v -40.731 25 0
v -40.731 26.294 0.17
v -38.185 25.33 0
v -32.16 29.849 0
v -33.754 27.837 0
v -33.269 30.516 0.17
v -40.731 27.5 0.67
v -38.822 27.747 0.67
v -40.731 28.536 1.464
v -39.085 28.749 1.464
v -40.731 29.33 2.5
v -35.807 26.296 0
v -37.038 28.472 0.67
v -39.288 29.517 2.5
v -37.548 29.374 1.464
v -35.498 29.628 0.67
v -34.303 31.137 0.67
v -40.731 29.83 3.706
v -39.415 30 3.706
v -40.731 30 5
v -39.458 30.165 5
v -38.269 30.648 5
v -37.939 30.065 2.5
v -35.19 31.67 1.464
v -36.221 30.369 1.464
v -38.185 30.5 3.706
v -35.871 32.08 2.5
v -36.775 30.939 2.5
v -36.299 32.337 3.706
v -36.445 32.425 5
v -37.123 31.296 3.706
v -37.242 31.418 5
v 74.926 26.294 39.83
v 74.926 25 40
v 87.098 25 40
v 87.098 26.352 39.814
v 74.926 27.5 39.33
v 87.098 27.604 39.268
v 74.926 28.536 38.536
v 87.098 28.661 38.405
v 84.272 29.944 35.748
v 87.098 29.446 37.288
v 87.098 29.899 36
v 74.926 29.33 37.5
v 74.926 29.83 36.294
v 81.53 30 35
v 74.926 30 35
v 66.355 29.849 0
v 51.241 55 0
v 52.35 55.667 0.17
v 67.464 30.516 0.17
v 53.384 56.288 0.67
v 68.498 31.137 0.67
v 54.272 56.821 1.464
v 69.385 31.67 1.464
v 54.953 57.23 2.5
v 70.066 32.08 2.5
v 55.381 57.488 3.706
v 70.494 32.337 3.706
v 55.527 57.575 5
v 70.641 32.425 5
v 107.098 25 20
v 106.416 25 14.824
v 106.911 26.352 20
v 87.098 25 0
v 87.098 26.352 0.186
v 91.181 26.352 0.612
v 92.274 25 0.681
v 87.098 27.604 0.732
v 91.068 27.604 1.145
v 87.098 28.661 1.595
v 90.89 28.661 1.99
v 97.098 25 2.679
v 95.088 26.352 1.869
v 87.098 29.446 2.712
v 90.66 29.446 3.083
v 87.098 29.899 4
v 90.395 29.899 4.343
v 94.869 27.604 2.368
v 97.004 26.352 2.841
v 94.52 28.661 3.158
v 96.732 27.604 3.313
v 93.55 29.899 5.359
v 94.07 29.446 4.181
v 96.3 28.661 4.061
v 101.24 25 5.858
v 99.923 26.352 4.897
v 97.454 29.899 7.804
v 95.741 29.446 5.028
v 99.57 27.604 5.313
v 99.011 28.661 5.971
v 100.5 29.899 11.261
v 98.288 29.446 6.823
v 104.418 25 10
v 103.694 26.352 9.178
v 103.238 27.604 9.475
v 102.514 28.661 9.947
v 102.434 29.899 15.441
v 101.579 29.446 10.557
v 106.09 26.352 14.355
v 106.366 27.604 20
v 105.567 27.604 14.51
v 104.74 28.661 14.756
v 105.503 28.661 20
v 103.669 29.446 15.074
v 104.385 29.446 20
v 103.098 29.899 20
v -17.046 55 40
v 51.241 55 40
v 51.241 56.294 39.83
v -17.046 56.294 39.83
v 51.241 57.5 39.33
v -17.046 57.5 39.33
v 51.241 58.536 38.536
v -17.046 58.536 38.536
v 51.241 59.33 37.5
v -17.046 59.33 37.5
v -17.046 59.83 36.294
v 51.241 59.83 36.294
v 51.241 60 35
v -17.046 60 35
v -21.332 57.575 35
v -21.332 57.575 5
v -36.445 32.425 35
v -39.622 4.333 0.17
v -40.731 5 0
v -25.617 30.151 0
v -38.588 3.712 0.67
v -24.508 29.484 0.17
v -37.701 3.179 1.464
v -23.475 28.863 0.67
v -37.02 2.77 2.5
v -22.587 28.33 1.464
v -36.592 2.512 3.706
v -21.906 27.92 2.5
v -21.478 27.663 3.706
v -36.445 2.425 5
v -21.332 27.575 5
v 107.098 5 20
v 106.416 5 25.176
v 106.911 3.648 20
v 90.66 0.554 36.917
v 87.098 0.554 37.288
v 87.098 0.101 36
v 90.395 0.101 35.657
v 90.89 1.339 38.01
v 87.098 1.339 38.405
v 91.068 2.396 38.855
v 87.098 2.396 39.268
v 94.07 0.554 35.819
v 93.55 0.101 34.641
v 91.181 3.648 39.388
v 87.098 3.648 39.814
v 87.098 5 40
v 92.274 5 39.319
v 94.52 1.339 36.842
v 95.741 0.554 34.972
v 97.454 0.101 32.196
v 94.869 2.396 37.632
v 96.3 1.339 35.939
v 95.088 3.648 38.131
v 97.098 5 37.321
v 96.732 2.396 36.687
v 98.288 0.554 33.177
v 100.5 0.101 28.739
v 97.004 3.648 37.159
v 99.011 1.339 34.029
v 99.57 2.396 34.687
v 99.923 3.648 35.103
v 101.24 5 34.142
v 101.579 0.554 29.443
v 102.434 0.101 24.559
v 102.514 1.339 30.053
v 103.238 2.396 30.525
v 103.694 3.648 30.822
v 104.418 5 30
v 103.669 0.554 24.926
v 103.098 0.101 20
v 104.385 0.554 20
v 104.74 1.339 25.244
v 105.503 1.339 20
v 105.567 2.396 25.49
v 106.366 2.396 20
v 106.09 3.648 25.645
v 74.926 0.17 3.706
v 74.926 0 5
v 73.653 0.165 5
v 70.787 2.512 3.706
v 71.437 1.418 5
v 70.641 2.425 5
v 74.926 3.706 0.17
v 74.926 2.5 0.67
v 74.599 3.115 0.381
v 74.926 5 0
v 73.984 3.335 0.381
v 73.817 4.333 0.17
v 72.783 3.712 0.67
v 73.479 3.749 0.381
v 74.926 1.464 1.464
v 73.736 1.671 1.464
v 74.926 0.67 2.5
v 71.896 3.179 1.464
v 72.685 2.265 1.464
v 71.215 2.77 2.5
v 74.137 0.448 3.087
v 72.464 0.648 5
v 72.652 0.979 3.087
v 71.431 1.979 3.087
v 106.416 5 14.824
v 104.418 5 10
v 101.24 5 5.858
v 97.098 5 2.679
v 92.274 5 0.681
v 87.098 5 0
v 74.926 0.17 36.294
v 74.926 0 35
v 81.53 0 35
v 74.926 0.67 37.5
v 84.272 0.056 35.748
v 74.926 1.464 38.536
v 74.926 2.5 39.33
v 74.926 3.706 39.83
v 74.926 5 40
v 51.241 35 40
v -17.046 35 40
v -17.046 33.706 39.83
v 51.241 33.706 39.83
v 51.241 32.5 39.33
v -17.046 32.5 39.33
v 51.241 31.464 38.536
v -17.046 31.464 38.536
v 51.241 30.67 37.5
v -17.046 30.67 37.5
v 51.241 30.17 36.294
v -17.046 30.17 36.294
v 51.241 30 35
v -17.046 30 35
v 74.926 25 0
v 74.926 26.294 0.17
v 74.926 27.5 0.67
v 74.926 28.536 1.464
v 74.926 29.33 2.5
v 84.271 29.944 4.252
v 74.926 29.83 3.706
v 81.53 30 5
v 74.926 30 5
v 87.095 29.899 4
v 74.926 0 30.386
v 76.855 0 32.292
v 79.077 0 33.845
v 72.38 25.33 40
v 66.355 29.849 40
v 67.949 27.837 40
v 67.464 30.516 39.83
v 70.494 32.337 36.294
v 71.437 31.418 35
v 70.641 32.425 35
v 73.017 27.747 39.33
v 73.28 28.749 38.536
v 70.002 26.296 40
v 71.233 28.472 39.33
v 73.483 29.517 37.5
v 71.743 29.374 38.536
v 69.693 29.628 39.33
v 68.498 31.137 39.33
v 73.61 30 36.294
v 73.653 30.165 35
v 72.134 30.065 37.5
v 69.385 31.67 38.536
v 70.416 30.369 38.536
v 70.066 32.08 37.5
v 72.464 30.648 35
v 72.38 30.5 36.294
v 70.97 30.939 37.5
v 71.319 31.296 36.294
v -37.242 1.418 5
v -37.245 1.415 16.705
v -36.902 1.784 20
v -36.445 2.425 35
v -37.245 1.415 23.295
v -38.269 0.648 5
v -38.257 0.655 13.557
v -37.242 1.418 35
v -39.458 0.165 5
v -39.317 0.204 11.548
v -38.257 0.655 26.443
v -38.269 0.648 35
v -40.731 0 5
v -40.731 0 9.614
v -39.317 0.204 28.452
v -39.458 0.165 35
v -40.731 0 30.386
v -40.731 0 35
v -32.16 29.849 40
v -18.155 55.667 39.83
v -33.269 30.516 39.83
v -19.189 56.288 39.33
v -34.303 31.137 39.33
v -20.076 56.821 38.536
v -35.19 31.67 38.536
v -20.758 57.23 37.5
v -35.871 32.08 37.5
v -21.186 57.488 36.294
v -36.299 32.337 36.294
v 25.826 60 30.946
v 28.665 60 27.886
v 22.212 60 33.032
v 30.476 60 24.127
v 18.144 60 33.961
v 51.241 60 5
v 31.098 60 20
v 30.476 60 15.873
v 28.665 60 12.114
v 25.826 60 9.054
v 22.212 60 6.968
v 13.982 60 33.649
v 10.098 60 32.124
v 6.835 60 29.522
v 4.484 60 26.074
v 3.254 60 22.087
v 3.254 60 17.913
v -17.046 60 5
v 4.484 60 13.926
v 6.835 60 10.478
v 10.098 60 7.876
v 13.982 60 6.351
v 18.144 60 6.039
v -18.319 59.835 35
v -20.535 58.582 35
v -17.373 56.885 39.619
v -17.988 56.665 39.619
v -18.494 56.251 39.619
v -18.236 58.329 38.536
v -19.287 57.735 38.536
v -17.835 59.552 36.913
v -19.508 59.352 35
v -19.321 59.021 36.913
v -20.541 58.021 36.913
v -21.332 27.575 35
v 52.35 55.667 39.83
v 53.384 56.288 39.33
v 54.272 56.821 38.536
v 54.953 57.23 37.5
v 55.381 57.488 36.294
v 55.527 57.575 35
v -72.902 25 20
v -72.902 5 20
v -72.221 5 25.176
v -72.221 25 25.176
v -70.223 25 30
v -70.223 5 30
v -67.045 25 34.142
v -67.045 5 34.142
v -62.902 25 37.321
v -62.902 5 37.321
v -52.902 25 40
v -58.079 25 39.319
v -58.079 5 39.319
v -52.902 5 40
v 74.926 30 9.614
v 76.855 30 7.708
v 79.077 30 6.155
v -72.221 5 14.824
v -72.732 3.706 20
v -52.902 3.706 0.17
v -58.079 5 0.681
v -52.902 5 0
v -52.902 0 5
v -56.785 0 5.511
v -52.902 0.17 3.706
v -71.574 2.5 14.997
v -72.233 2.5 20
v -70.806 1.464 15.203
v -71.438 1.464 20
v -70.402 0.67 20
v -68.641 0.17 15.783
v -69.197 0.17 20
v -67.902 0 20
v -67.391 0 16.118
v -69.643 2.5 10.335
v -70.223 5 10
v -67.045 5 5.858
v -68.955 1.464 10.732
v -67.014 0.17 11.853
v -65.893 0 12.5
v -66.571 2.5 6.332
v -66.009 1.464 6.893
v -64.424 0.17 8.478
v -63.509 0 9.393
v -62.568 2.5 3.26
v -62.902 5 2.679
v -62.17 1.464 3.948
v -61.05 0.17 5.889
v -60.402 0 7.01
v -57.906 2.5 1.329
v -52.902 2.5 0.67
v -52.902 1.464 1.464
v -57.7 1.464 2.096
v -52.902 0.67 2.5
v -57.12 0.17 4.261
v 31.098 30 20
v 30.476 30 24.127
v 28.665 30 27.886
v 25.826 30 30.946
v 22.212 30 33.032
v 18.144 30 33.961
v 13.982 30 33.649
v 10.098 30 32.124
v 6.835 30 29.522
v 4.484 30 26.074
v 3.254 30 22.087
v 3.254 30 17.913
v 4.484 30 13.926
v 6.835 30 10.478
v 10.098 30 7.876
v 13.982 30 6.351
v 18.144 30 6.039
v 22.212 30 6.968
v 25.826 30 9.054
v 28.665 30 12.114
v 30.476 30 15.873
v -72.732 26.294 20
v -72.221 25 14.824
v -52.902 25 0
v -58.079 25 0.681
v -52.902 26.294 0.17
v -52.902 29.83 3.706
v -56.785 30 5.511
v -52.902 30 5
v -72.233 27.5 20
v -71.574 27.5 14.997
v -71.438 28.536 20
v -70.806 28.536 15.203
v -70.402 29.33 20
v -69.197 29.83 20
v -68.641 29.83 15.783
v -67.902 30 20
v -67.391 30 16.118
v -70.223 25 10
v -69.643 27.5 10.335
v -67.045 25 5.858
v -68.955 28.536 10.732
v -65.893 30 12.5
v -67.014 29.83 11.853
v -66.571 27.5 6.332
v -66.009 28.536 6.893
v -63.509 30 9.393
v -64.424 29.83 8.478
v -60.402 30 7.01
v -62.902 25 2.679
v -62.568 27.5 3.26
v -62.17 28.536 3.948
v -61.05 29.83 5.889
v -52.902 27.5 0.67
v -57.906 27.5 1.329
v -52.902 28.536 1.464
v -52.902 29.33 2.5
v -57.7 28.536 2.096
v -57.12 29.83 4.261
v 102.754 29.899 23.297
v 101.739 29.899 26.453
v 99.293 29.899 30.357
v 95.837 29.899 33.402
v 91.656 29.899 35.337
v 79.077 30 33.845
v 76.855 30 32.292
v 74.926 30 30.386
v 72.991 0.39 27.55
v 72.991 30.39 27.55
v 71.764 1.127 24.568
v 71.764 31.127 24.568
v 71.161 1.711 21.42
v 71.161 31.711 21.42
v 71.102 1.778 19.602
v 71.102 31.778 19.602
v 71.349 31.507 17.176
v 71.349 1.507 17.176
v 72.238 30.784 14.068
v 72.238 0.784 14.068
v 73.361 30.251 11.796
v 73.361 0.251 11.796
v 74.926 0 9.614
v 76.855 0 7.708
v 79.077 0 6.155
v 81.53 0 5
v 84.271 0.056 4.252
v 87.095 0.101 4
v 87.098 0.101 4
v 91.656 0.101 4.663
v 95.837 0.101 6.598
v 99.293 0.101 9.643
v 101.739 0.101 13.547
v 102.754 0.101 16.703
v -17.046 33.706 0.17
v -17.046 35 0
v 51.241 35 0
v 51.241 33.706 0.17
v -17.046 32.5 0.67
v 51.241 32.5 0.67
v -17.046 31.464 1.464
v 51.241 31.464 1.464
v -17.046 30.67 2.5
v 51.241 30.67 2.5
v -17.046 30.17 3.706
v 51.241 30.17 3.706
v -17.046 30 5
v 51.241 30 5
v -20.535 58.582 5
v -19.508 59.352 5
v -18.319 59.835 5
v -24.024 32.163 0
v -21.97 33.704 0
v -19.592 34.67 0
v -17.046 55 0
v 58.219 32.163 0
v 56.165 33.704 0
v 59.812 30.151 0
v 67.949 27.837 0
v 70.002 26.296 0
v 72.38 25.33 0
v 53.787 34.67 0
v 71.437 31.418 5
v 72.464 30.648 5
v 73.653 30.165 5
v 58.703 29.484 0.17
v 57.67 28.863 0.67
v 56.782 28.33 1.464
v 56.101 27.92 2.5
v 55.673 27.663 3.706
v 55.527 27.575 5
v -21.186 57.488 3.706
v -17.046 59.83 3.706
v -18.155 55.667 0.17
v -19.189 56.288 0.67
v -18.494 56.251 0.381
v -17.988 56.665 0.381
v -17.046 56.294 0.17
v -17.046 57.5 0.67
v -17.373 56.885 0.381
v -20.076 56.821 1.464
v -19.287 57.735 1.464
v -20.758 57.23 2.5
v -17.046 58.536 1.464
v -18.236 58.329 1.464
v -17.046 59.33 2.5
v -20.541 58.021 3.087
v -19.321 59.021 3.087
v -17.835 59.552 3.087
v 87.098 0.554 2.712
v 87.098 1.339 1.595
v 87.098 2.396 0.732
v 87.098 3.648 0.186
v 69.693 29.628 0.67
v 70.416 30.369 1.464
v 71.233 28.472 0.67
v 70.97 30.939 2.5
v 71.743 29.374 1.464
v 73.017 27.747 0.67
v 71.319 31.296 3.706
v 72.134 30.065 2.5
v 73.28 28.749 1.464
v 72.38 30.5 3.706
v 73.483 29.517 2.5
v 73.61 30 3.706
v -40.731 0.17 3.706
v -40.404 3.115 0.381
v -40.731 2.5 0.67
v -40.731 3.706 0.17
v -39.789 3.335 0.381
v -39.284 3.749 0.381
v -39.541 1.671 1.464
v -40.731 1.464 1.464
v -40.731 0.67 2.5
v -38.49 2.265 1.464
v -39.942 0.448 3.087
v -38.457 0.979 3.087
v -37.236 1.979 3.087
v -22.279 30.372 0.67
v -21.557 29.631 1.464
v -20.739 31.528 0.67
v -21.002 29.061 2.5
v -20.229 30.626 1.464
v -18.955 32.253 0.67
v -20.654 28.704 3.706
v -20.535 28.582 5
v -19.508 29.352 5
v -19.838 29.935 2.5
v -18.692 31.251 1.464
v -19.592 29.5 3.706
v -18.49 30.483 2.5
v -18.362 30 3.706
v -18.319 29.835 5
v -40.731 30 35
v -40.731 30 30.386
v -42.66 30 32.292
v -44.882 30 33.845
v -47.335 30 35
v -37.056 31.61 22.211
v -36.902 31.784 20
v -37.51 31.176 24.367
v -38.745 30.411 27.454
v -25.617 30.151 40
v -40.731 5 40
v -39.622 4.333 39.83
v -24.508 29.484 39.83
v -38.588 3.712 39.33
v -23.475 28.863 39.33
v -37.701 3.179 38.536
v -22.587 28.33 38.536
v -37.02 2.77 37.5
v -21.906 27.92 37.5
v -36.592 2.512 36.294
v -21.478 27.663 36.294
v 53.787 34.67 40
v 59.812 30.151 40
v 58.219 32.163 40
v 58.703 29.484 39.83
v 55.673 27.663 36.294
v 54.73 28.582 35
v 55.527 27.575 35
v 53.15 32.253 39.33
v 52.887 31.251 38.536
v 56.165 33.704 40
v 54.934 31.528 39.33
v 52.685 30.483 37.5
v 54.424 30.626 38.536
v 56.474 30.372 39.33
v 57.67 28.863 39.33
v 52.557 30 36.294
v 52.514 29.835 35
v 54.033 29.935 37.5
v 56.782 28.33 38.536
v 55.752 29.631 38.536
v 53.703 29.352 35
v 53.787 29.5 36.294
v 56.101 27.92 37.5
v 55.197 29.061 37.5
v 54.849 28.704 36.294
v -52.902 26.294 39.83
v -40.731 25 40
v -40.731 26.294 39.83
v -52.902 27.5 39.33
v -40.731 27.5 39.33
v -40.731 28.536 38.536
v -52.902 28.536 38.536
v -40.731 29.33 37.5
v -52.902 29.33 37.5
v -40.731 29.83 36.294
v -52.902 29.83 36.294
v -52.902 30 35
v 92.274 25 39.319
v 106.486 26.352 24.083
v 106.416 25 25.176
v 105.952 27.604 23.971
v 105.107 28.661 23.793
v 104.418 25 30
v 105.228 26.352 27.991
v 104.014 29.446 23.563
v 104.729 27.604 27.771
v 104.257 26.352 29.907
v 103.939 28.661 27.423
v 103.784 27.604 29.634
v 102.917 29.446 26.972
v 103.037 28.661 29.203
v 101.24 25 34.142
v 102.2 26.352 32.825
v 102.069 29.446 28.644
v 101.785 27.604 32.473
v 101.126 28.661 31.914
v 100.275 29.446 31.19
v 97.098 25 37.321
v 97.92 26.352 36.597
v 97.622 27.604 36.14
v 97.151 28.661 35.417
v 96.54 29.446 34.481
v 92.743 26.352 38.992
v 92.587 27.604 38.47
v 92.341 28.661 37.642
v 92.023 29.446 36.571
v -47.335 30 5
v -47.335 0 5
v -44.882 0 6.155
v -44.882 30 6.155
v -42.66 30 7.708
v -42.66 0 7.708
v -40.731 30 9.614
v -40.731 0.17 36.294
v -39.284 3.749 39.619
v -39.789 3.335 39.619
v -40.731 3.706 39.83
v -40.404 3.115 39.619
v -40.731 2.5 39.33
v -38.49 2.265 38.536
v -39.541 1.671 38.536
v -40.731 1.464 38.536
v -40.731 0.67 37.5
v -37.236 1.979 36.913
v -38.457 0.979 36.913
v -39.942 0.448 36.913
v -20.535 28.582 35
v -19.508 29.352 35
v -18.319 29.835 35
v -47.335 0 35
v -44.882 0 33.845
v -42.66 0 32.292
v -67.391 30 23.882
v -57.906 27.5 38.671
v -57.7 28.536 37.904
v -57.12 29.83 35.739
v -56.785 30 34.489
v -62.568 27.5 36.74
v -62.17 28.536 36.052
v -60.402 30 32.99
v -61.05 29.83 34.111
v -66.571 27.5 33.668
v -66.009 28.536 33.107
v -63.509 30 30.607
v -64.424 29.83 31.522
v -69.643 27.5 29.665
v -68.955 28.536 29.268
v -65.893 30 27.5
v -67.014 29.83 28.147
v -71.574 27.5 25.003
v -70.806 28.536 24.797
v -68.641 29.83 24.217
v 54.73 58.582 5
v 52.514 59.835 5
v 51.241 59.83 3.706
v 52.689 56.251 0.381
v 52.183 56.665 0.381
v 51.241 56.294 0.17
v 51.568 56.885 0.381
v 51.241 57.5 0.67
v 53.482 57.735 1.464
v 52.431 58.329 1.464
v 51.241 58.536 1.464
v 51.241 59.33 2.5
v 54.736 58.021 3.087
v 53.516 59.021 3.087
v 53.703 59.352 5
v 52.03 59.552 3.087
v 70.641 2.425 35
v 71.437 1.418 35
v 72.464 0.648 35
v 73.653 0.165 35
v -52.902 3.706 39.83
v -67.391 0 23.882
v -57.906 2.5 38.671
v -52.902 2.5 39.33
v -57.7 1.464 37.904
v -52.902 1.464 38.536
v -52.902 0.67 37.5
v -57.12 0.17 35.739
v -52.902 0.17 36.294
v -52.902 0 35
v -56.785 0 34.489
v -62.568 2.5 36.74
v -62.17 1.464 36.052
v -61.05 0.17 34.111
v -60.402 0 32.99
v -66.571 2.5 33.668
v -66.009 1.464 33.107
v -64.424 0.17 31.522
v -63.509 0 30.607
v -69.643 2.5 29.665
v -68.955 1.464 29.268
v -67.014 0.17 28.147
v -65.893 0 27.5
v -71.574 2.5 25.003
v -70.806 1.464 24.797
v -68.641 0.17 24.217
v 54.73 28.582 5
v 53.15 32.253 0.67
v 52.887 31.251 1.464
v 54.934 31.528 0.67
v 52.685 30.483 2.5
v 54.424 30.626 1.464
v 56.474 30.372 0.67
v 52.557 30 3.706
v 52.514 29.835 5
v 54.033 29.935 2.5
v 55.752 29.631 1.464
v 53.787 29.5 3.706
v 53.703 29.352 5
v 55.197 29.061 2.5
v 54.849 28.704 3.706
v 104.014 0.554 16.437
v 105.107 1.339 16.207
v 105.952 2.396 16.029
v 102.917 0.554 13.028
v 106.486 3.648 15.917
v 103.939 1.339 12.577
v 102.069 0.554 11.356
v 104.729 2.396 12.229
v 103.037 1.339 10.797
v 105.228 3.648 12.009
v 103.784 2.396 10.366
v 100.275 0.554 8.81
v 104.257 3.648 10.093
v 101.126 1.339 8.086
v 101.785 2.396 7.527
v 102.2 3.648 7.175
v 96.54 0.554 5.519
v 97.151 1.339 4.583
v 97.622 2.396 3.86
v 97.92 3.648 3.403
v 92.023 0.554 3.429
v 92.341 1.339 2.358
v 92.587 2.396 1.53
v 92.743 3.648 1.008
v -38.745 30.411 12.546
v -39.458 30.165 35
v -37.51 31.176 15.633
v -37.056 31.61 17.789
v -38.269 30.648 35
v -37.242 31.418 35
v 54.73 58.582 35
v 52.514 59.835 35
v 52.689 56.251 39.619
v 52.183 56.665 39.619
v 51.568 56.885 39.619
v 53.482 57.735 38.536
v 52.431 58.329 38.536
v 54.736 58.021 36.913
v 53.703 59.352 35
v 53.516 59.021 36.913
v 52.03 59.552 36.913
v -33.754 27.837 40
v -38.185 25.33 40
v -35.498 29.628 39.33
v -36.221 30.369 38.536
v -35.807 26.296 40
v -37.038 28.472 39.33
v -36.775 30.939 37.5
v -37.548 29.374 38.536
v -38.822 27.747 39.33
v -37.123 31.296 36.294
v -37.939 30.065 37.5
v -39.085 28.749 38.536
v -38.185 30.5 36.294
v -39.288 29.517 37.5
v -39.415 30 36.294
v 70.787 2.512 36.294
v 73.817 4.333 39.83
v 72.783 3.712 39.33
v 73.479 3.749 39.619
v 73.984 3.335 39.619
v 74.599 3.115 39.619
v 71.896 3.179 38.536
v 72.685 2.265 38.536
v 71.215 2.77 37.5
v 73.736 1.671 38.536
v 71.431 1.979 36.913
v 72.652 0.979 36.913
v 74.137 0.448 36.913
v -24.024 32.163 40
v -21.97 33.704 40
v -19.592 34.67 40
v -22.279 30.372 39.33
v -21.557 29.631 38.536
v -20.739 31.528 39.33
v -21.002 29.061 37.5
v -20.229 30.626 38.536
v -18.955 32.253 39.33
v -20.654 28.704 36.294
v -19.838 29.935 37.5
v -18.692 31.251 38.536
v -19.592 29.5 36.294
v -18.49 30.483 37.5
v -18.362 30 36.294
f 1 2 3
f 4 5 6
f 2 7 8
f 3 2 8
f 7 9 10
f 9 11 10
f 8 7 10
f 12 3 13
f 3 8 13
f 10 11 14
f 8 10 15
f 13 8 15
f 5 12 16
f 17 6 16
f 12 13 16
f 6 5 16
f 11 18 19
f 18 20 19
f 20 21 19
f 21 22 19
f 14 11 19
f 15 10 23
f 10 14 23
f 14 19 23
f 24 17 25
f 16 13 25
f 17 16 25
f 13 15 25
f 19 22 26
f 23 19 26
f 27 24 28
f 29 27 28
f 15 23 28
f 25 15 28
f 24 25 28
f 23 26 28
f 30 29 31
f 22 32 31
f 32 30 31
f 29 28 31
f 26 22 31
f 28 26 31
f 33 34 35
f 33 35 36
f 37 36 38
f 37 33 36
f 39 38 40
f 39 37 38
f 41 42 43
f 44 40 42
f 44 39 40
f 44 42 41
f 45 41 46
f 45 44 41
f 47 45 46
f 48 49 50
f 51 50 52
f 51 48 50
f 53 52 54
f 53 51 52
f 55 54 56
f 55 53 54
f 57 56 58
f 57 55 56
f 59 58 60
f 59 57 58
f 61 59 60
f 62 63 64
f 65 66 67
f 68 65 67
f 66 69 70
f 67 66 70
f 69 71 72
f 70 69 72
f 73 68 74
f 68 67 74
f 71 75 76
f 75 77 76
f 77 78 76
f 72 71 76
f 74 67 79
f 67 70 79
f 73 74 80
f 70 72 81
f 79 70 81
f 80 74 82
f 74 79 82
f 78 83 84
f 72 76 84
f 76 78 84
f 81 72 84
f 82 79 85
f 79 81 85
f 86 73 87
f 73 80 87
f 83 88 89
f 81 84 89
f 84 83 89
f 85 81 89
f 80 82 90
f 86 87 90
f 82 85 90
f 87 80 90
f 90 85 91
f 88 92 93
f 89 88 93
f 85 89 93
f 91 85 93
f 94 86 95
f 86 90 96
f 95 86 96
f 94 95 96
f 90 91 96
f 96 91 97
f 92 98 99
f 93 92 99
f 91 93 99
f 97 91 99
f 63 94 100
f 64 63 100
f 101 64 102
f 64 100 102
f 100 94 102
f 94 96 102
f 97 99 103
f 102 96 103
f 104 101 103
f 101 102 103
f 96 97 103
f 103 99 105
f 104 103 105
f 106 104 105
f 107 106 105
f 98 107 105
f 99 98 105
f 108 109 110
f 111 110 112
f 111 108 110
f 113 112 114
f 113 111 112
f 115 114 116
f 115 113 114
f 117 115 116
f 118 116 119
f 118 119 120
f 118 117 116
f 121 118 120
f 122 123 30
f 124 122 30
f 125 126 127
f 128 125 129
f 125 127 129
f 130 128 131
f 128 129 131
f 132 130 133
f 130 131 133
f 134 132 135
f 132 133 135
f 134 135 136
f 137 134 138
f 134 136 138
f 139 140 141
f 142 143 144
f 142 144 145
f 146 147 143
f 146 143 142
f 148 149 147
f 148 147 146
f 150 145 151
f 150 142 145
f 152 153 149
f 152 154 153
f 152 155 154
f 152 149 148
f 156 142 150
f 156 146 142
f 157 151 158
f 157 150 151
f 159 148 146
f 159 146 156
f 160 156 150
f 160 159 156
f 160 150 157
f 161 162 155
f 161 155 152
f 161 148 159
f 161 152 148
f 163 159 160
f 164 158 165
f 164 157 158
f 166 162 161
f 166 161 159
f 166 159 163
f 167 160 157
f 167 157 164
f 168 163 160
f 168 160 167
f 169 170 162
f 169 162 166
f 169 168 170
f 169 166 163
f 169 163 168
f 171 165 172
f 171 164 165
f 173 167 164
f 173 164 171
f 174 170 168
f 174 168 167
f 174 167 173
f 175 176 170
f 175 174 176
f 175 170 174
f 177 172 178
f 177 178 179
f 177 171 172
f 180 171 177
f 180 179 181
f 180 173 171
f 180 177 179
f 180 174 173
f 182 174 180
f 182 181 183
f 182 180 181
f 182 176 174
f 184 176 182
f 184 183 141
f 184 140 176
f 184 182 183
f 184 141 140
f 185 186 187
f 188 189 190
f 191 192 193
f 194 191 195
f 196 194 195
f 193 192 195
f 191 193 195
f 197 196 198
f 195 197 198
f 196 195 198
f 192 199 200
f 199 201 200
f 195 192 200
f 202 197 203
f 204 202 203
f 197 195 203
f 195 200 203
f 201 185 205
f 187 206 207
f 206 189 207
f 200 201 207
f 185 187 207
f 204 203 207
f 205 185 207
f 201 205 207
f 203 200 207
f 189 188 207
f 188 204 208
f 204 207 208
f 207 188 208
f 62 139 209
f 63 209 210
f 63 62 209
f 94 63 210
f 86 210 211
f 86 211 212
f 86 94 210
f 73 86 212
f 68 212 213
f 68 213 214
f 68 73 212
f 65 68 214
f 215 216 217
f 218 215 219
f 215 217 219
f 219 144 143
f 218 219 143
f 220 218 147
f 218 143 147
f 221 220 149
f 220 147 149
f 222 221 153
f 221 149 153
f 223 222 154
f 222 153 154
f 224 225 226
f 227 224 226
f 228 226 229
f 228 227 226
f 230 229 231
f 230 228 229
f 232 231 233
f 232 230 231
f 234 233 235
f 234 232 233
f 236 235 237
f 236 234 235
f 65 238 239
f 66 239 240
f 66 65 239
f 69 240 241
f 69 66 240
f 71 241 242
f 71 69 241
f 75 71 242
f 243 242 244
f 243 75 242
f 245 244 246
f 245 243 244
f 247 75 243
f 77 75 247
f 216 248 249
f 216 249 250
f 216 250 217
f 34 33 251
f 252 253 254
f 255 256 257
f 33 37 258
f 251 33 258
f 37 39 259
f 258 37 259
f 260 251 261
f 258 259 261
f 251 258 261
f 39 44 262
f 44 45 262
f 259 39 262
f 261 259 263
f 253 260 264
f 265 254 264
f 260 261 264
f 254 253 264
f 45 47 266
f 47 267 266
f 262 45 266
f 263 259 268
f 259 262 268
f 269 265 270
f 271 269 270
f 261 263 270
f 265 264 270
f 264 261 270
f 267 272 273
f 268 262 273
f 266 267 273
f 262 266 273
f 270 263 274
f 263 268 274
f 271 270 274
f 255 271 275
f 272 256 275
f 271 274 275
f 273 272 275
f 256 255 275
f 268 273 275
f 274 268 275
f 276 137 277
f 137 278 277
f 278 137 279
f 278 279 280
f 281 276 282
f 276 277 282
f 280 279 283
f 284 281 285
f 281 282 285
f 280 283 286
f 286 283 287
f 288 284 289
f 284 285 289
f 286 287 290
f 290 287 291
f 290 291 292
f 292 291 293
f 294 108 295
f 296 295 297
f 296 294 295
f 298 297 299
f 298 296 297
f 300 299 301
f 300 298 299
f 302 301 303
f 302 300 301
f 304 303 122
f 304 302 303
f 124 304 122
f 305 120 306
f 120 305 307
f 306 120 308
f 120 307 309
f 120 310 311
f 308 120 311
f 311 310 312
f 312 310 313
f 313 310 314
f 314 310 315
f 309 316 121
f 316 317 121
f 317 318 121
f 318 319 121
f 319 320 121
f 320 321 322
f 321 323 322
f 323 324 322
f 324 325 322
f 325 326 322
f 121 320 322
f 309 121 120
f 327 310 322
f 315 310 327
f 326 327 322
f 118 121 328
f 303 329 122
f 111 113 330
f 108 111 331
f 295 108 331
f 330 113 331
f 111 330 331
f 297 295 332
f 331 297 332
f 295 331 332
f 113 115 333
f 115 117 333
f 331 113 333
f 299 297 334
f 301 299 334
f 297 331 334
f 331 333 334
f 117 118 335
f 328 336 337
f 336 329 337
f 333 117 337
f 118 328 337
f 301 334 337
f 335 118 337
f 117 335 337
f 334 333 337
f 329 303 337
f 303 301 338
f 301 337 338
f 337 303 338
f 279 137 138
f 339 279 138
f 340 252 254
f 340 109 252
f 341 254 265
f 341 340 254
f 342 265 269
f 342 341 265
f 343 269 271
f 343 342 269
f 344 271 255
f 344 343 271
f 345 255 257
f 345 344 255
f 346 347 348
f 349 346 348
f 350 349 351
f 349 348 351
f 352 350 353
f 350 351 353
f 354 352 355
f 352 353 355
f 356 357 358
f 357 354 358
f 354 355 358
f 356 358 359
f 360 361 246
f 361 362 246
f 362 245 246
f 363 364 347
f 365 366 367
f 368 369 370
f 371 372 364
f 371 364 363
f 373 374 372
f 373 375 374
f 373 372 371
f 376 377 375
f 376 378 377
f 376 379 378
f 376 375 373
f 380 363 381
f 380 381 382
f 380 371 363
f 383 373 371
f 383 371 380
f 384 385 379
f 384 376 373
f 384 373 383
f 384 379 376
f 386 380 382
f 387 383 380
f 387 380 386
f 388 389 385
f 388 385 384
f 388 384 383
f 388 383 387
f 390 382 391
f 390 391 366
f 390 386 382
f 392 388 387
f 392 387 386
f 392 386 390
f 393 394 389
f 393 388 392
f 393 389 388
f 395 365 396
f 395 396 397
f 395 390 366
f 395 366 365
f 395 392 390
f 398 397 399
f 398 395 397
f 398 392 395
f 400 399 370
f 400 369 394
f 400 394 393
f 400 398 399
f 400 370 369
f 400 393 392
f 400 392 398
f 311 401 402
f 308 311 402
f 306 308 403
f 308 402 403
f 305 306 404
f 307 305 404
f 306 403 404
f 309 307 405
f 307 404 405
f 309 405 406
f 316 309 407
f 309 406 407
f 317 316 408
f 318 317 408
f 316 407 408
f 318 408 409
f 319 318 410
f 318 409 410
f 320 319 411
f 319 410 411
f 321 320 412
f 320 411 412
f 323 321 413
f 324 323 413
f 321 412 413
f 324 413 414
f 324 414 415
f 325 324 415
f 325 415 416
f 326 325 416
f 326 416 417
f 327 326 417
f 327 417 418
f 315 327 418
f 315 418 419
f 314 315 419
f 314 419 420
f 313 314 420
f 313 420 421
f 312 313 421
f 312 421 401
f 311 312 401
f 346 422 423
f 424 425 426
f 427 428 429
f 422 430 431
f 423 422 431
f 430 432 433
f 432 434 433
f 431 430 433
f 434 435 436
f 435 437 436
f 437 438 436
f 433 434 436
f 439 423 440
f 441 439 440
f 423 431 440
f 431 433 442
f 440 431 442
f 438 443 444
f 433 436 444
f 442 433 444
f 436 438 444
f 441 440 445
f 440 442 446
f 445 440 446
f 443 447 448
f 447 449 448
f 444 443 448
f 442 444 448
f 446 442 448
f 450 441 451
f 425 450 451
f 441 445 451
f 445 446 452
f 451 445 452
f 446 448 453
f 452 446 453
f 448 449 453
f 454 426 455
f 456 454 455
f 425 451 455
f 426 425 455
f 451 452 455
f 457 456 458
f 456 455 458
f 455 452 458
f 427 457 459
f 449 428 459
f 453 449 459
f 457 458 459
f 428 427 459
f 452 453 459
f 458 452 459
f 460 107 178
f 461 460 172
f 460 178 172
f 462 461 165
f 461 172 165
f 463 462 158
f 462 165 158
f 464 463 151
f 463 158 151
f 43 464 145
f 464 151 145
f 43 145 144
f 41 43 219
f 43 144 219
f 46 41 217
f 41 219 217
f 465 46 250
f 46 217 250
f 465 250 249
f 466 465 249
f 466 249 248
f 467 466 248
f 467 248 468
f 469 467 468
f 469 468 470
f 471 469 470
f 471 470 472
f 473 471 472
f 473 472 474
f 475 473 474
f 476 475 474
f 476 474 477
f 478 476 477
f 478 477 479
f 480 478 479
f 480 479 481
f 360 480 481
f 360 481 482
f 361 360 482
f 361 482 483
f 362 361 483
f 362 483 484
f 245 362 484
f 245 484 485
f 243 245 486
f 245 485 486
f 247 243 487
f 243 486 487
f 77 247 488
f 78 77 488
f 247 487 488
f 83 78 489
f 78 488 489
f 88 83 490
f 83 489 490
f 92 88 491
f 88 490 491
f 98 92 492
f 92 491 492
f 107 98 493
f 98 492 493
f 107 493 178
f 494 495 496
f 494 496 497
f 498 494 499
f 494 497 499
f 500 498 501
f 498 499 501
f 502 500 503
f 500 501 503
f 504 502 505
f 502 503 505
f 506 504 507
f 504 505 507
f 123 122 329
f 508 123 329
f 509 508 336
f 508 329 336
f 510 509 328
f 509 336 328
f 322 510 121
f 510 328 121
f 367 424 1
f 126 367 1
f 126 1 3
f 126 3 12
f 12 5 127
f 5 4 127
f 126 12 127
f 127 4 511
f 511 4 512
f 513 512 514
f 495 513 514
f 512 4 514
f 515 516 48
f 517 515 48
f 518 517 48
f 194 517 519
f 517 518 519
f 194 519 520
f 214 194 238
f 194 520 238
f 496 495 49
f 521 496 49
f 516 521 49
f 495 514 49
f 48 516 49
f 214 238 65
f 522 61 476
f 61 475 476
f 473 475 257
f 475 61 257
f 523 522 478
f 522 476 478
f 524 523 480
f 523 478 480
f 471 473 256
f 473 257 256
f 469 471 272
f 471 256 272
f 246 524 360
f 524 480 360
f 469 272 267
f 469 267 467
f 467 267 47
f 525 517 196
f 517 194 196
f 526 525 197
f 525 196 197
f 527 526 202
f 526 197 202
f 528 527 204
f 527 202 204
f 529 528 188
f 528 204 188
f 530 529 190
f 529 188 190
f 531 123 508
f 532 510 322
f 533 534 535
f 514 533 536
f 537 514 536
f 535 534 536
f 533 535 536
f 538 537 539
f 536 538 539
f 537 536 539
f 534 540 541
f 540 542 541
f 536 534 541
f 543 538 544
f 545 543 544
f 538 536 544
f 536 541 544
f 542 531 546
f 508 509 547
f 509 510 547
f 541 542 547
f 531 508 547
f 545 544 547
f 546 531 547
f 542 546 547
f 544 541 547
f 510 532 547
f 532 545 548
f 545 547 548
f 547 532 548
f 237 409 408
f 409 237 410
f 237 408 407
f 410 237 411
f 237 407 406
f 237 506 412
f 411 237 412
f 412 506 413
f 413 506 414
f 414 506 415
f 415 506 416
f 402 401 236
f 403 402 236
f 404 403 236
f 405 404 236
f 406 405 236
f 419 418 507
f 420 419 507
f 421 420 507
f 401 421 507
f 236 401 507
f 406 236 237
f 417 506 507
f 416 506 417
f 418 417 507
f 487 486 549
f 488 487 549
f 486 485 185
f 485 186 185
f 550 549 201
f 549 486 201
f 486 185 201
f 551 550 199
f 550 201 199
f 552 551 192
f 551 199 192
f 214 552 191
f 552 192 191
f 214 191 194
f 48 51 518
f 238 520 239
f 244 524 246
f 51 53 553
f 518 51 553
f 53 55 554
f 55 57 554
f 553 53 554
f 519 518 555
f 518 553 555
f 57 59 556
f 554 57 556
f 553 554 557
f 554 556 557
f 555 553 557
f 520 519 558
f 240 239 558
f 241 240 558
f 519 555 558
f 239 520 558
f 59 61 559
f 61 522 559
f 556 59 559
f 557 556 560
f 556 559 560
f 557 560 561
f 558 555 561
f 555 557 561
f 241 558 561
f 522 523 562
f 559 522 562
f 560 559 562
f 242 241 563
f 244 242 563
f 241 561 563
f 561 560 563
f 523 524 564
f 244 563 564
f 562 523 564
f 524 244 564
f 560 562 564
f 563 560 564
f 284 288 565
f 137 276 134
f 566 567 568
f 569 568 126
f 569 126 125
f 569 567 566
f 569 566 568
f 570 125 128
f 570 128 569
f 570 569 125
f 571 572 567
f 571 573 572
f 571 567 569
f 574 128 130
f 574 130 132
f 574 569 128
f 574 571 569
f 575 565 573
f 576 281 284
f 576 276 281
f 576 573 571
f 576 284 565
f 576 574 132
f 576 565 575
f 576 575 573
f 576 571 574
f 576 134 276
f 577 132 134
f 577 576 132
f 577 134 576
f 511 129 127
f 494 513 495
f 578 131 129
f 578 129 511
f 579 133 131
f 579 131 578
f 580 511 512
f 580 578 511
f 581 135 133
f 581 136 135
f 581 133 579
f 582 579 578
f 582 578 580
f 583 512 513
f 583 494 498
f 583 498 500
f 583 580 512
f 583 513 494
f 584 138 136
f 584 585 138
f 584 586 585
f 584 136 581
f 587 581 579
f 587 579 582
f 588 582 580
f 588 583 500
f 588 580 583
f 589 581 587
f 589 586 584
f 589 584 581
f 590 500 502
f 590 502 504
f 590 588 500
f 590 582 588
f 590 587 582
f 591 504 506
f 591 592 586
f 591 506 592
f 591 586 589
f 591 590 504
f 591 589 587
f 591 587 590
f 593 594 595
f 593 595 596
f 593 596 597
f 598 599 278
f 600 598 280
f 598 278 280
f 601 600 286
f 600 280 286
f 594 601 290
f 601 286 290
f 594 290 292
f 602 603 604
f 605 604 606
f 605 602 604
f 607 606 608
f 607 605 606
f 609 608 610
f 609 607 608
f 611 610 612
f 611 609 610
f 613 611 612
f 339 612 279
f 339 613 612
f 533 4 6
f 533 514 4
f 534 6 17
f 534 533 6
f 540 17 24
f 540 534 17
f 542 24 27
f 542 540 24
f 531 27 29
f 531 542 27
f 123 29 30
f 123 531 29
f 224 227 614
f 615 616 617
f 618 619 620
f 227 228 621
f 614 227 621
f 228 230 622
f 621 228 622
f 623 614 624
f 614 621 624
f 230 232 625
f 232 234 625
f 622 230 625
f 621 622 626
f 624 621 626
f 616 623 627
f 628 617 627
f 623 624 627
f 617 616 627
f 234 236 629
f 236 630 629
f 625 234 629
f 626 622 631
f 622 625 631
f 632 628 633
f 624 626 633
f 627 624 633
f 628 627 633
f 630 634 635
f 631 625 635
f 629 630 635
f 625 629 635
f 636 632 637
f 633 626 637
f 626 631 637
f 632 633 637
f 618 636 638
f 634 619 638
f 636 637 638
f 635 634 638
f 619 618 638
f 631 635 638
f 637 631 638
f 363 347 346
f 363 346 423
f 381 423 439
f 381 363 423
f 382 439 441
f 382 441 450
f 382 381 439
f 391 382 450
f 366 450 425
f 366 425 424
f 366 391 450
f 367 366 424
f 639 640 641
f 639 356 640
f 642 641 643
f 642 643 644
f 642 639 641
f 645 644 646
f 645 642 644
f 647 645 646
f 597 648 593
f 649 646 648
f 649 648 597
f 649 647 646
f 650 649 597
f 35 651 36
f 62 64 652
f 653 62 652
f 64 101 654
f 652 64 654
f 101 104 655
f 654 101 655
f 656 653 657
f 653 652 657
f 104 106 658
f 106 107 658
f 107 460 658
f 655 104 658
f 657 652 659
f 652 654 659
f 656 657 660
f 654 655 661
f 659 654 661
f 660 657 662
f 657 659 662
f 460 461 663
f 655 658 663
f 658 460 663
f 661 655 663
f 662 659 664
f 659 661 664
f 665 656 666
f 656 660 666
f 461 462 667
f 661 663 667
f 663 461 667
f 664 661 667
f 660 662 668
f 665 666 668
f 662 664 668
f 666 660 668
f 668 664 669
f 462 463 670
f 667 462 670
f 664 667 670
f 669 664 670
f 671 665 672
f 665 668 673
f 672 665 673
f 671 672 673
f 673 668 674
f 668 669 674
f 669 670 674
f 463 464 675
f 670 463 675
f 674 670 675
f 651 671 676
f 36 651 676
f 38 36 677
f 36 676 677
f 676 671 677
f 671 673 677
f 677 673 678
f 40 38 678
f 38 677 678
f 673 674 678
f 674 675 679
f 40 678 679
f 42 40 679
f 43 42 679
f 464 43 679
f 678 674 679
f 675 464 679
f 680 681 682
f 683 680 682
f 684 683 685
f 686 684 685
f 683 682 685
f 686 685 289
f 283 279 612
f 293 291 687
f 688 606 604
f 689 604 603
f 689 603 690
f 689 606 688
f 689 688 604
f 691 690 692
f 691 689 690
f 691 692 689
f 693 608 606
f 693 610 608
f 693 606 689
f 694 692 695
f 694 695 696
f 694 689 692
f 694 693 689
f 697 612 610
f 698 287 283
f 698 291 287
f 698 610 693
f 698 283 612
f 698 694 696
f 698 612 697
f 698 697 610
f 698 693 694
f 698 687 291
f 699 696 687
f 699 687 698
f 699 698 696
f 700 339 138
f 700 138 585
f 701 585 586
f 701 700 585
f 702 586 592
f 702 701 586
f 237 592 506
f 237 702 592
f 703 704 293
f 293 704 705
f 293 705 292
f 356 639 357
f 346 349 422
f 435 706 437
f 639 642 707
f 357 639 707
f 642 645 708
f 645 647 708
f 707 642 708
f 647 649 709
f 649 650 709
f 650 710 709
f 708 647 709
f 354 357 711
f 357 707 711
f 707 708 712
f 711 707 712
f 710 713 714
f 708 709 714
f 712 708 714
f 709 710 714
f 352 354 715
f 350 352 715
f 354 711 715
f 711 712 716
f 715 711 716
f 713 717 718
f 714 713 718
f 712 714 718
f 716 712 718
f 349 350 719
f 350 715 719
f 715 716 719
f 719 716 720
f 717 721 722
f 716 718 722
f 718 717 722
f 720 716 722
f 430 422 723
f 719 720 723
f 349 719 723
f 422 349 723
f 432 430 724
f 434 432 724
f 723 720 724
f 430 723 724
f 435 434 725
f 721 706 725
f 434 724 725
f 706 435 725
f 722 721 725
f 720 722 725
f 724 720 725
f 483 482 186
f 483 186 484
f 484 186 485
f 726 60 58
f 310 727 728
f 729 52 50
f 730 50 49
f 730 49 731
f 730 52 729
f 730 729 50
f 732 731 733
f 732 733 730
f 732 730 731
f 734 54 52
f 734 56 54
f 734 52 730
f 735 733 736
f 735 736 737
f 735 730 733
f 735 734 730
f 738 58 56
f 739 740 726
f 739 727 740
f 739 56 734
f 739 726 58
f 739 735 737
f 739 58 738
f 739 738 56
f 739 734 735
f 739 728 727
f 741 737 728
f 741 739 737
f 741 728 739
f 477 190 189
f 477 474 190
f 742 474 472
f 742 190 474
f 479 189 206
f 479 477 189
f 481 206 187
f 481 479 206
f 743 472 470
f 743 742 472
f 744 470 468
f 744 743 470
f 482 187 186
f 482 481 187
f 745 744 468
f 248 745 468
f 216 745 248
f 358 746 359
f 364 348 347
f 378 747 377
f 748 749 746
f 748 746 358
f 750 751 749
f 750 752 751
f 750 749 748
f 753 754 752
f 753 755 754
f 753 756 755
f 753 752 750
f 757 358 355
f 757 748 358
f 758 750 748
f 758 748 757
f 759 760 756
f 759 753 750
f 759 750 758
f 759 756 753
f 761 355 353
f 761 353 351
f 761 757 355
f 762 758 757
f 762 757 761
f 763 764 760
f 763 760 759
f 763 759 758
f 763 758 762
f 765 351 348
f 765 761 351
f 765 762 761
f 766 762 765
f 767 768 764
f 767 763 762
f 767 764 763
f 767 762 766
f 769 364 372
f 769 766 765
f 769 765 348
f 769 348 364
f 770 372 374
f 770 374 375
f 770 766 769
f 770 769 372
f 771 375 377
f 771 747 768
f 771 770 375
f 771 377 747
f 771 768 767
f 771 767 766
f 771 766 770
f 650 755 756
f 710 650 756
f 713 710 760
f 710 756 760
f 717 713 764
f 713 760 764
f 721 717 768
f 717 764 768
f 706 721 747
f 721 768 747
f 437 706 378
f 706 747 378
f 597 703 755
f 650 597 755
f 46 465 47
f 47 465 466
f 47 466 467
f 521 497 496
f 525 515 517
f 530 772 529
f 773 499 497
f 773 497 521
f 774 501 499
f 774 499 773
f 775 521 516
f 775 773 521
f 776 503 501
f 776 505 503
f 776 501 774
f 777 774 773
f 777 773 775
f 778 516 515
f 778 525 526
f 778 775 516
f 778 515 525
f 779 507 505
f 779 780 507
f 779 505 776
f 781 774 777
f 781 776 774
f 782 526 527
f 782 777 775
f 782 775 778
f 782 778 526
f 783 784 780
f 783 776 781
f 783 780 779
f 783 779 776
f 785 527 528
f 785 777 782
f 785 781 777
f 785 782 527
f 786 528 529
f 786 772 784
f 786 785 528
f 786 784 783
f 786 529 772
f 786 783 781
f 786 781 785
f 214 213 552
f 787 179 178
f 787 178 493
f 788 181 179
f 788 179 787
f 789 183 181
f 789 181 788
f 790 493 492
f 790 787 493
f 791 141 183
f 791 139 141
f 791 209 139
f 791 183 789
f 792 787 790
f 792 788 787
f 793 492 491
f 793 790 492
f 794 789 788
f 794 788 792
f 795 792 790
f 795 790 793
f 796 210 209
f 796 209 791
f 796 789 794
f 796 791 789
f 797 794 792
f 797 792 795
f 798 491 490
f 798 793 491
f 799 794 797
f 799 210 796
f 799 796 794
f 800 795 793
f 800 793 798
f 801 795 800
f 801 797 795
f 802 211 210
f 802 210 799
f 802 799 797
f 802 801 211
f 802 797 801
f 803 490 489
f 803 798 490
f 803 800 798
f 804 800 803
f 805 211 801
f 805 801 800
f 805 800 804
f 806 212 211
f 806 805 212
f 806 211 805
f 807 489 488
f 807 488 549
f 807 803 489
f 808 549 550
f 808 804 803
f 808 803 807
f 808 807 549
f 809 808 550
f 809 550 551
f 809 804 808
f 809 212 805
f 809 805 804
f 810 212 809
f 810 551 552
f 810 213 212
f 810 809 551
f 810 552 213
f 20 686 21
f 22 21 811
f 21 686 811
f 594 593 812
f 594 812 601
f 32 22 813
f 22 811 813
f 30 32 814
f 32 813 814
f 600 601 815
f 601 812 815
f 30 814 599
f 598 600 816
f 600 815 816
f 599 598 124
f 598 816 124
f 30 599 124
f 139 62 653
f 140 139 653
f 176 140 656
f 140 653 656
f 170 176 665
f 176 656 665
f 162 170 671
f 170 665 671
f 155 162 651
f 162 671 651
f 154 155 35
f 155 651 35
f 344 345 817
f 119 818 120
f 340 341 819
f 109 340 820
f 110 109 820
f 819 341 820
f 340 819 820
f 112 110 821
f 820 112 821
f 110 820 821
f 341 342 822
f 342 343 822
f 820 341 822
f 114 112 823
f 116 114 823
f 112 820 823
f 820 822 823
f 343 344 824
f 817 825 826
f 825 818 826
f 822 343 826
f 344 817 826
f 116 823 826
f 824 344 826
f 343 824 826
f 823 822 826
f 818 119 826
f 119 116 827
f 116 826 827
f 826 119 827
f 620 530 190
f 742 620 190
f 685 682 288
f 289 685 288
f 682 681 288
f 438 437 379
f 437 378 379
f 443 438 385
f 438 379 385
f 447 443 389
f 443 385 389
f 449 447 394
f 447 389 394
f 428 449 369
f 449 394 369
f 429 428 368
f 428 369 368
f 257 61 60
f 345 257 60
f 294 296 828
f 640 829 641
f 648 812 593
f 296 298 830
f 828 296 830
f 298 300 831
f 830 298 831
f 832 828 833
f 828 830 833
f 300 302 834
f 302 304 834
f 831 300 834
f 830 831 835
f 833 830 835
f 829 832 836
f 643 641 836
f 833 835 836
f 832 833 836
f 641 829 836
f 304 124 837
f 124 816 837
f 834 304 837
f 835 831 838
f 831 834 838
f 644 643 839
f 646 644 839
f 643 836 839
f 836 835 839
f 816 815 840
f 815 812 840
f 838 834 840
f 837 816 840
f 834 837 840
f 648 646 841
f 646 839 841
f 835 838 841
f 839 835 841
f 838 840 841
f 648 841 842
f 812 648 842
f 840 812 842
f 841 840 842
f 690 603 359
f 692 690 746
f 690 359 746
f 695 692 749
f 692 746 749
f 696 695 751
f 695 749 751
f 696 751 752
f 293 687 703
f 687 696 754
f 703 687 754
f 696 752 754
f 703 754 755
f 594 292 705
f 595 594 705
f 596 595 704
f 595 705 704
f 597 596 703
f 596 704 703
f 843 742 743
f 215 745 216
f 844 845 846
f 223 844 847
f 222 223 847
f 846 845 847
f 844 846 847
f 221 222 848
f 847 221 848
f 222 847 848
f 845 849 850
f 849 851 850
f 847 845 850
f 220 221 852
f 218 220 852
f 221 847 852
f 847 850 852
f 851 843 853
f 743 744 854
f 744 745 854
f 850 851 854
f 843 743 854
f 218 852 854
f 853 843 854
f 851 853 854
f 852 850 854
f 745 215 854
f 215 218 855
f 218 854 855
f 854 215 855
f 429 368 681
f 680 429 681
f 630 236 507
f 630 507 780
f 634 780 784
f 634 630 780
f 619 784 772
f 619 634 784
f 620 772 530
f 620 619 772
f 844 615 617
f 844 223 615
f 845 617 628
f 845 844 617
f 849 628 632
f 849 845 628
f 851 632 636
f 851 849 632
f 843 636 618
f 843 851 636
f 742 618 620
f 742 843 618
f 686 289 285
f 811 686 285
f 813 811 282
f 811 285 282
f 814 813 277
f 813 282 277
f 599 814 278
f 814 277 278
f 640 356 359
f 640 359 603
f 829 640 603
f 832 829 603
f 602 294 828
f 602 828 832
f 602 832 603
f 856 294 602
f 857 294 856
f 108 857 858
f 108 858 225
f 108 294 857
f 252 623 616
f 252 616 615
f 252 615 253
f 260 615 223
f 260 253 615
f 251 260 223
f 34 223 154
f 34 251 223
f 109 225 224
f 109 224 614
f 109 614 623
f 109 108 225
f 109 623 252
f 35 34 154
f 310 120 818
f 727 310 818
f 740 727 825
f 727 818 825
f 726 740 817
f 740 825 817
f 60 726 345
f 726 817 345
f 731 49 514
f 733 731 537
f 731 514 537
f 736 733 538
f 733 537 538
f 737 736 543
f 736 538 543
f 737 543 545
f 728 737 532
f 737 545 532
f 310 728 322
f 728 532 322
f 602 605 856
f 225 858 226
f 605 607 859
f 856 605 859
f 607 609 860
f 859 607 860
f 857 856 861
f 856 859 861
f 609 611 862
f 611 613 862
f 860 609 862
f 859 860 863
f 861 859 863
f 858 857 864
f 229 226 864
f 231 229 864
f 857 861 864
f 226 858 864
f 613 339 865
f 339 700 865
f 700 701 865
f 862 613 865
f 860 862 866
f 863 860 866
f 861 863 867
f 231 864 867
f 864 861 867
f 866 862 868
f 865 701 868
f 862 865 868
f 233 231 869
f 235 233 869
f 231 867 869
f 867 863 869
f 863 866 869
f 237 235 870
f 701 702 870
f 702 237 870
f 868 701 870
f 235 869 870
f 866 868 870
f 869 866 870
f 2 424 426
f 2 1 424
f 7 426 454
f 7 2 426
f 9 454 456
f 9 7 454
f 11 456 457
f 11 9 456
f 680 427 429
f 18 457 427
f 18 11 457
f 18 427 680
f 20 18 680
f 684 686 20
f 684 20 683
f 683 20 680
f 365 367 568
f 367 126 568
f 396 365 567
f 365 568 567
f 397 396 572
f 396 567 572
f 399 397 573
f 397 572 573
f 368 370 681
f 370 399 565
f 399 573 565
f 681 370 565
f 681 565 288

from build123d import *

# Parameters (mm, degrees)
F1_DEPTH = 40
F2_R     = 19.99999
F3_F1_R  = 5
F3_F2_R  = 5
F4_R     = 16
F4_R_2   = 14
F5_DEPTH = 66.5


# Not quite as in the source:
# - a fillet or chamfer is up to 0.001 mm smaller than in the source, because OpenCascade refuses the exact size
# - ends of sketch curves that miss each other by under 0.0002 mm in the source are joined


with BuildPart() as f1:
    # F0 (on Top) → F1 (new body)
    with BuildSketch(Plane.XY):
        Polygon((-72.9024875954, 30), (-72.9024875954, 0), (-37.9024875954, 0), (-19.8747312181, 30), (17.0975124046, 30), (54.0697560273, 30), (72.0975124046, 0), (107.0975124046, 0), (107.0975124046, 30), (72.0975124046, 30), (54.0697560273, 60), (17.0975124046, 60), (-19.8747312181, 60), (-37.9024875954, 30), align=None)
    extrude(amount=F1_DEPTH)

    # F2 (radius 20 in the source; OpenCascade refuses exactly that, so slightly less here)
    f2_edges = [f1.edges().sort_by_distance(p)[0] for p in [
        (-72.902488, 15, 40),
        (-72.902488, 15, 0),
        (107.097512, 15, 40),
        (107.097512, 15, 0),
    ]]
    fillet(f2_edges, radius=F2_R)

    # F3: fillet of radius 5 on 16 edges, made by hand

    # F3_f1
    f3_f1_edges = [f1.edges().sort_by_distance(p)[0] for p in [
        (-19.8747312181, 30, 20),
        (54.0697560273, 30, 20),
        (72.0975124046, 30, 20),
        (-37.9024875954, 30, 20),
    ]]
    fillet(f3_f1_edges, radius=F3_F1_R)

    # F3_f2
    f3_f2_edges = [f1.edges().sort_by_distance(p)[0] for p in [
        (-37.9024875954, 0, 20),
        (72.0975124046, 0, 20),
        (54.0697560273, 60, 20),
        (-19.8747312181, 60, 20),
        (62.3551307083, 46.2123031159, 40),
        (17.0975124046, 60, 40),
        (-28.1601058991, 46.2123031159, 40),
        (63.8121377235, 13.7876968841, 40),
        (101.2396509572, 0, 5.8578614473),
        (-67.0446261481, 0, 5.8578614473),
        (17.0975124046, 30, 0),
        (17.0975124046, 60, 0),
        (-72.9024875954, 0, 20),
        (-45.4024925954, 0, 0),
        (-67.0446261481, 0, 34.1421385527),
        (-45.4024925954, 0, 40),
        (107.0975124046, 0, 20),
        (79.5975174046, 0, 0),
        (101.2396509572, 0, 34.1421385527),
        (79.5975174046, 0, 40),
        (-19.5080384845, 29.3518369019, 0),
        (53.7030632936, 29.3518369019, 0),
        (53.7030632936, 29.3518369019, 40),
        (-38.269180329, 30.6481630981, 40),
        (72.4642051382, 30.6481630981, 40),
    ]]
    fillet(f3_f2_edges, radius=F3_F2_R)

    # F4 (on face) → F5 (cut)
    with BuildSketch(Plane.XZ):
        with BuildLine():
            Line((-40.7311948659, 9.6144507468), (-40.7311948659, 30.3855492532))
            ThreePointArc((-40.7311948659, 30.3855492532), (-43.7377821689, 33.1151886927), (-47.3347232326, 35))
            Line((-47.3347232326, 35), (-52.9024975954, 35))
            ThreePointArc((-52.9024975954, 35), (-63.5090922422, 30.6066046467), (-67.9024875954, 20.00001))
            ThreePointArc((-67.9024875954, 20.00001), (-63.5090922422, 9.3933953533), (-52.9024975954, 5))
            Line((-52.9024975954, 5), (-47.3347232326, 5))
            ThreePointArc((-47.3347232326, 5), (-43.7377821689, 6.8848113073), (-40.7311948659, 9.6144507468))
        make_face()
        with Locations((87.0975124046, 20)):
            Circle(F4_R)
        with BuildLine():
            ThreePointArc((-40.7311948659, 9.6144507468), (-37.8901479431, 14.4655932419), (-36.9024875954, 20))
            ThreePointArc((-36.9024875954, 20), (-37.8901479431, 25.5344067581), (-40.7311948659, 30.3855492532))
            Line((-40.7311948659, 30.3855492532), (-40.7311948659, 9.6144507468))
        make_face()
        with Locations((17.0975124046, 20)):
            Circle(F4_R_2)
    extrude(amount=-F5_DEPTH, mode=Mode.SUBTRACT)


solid = f1.part
